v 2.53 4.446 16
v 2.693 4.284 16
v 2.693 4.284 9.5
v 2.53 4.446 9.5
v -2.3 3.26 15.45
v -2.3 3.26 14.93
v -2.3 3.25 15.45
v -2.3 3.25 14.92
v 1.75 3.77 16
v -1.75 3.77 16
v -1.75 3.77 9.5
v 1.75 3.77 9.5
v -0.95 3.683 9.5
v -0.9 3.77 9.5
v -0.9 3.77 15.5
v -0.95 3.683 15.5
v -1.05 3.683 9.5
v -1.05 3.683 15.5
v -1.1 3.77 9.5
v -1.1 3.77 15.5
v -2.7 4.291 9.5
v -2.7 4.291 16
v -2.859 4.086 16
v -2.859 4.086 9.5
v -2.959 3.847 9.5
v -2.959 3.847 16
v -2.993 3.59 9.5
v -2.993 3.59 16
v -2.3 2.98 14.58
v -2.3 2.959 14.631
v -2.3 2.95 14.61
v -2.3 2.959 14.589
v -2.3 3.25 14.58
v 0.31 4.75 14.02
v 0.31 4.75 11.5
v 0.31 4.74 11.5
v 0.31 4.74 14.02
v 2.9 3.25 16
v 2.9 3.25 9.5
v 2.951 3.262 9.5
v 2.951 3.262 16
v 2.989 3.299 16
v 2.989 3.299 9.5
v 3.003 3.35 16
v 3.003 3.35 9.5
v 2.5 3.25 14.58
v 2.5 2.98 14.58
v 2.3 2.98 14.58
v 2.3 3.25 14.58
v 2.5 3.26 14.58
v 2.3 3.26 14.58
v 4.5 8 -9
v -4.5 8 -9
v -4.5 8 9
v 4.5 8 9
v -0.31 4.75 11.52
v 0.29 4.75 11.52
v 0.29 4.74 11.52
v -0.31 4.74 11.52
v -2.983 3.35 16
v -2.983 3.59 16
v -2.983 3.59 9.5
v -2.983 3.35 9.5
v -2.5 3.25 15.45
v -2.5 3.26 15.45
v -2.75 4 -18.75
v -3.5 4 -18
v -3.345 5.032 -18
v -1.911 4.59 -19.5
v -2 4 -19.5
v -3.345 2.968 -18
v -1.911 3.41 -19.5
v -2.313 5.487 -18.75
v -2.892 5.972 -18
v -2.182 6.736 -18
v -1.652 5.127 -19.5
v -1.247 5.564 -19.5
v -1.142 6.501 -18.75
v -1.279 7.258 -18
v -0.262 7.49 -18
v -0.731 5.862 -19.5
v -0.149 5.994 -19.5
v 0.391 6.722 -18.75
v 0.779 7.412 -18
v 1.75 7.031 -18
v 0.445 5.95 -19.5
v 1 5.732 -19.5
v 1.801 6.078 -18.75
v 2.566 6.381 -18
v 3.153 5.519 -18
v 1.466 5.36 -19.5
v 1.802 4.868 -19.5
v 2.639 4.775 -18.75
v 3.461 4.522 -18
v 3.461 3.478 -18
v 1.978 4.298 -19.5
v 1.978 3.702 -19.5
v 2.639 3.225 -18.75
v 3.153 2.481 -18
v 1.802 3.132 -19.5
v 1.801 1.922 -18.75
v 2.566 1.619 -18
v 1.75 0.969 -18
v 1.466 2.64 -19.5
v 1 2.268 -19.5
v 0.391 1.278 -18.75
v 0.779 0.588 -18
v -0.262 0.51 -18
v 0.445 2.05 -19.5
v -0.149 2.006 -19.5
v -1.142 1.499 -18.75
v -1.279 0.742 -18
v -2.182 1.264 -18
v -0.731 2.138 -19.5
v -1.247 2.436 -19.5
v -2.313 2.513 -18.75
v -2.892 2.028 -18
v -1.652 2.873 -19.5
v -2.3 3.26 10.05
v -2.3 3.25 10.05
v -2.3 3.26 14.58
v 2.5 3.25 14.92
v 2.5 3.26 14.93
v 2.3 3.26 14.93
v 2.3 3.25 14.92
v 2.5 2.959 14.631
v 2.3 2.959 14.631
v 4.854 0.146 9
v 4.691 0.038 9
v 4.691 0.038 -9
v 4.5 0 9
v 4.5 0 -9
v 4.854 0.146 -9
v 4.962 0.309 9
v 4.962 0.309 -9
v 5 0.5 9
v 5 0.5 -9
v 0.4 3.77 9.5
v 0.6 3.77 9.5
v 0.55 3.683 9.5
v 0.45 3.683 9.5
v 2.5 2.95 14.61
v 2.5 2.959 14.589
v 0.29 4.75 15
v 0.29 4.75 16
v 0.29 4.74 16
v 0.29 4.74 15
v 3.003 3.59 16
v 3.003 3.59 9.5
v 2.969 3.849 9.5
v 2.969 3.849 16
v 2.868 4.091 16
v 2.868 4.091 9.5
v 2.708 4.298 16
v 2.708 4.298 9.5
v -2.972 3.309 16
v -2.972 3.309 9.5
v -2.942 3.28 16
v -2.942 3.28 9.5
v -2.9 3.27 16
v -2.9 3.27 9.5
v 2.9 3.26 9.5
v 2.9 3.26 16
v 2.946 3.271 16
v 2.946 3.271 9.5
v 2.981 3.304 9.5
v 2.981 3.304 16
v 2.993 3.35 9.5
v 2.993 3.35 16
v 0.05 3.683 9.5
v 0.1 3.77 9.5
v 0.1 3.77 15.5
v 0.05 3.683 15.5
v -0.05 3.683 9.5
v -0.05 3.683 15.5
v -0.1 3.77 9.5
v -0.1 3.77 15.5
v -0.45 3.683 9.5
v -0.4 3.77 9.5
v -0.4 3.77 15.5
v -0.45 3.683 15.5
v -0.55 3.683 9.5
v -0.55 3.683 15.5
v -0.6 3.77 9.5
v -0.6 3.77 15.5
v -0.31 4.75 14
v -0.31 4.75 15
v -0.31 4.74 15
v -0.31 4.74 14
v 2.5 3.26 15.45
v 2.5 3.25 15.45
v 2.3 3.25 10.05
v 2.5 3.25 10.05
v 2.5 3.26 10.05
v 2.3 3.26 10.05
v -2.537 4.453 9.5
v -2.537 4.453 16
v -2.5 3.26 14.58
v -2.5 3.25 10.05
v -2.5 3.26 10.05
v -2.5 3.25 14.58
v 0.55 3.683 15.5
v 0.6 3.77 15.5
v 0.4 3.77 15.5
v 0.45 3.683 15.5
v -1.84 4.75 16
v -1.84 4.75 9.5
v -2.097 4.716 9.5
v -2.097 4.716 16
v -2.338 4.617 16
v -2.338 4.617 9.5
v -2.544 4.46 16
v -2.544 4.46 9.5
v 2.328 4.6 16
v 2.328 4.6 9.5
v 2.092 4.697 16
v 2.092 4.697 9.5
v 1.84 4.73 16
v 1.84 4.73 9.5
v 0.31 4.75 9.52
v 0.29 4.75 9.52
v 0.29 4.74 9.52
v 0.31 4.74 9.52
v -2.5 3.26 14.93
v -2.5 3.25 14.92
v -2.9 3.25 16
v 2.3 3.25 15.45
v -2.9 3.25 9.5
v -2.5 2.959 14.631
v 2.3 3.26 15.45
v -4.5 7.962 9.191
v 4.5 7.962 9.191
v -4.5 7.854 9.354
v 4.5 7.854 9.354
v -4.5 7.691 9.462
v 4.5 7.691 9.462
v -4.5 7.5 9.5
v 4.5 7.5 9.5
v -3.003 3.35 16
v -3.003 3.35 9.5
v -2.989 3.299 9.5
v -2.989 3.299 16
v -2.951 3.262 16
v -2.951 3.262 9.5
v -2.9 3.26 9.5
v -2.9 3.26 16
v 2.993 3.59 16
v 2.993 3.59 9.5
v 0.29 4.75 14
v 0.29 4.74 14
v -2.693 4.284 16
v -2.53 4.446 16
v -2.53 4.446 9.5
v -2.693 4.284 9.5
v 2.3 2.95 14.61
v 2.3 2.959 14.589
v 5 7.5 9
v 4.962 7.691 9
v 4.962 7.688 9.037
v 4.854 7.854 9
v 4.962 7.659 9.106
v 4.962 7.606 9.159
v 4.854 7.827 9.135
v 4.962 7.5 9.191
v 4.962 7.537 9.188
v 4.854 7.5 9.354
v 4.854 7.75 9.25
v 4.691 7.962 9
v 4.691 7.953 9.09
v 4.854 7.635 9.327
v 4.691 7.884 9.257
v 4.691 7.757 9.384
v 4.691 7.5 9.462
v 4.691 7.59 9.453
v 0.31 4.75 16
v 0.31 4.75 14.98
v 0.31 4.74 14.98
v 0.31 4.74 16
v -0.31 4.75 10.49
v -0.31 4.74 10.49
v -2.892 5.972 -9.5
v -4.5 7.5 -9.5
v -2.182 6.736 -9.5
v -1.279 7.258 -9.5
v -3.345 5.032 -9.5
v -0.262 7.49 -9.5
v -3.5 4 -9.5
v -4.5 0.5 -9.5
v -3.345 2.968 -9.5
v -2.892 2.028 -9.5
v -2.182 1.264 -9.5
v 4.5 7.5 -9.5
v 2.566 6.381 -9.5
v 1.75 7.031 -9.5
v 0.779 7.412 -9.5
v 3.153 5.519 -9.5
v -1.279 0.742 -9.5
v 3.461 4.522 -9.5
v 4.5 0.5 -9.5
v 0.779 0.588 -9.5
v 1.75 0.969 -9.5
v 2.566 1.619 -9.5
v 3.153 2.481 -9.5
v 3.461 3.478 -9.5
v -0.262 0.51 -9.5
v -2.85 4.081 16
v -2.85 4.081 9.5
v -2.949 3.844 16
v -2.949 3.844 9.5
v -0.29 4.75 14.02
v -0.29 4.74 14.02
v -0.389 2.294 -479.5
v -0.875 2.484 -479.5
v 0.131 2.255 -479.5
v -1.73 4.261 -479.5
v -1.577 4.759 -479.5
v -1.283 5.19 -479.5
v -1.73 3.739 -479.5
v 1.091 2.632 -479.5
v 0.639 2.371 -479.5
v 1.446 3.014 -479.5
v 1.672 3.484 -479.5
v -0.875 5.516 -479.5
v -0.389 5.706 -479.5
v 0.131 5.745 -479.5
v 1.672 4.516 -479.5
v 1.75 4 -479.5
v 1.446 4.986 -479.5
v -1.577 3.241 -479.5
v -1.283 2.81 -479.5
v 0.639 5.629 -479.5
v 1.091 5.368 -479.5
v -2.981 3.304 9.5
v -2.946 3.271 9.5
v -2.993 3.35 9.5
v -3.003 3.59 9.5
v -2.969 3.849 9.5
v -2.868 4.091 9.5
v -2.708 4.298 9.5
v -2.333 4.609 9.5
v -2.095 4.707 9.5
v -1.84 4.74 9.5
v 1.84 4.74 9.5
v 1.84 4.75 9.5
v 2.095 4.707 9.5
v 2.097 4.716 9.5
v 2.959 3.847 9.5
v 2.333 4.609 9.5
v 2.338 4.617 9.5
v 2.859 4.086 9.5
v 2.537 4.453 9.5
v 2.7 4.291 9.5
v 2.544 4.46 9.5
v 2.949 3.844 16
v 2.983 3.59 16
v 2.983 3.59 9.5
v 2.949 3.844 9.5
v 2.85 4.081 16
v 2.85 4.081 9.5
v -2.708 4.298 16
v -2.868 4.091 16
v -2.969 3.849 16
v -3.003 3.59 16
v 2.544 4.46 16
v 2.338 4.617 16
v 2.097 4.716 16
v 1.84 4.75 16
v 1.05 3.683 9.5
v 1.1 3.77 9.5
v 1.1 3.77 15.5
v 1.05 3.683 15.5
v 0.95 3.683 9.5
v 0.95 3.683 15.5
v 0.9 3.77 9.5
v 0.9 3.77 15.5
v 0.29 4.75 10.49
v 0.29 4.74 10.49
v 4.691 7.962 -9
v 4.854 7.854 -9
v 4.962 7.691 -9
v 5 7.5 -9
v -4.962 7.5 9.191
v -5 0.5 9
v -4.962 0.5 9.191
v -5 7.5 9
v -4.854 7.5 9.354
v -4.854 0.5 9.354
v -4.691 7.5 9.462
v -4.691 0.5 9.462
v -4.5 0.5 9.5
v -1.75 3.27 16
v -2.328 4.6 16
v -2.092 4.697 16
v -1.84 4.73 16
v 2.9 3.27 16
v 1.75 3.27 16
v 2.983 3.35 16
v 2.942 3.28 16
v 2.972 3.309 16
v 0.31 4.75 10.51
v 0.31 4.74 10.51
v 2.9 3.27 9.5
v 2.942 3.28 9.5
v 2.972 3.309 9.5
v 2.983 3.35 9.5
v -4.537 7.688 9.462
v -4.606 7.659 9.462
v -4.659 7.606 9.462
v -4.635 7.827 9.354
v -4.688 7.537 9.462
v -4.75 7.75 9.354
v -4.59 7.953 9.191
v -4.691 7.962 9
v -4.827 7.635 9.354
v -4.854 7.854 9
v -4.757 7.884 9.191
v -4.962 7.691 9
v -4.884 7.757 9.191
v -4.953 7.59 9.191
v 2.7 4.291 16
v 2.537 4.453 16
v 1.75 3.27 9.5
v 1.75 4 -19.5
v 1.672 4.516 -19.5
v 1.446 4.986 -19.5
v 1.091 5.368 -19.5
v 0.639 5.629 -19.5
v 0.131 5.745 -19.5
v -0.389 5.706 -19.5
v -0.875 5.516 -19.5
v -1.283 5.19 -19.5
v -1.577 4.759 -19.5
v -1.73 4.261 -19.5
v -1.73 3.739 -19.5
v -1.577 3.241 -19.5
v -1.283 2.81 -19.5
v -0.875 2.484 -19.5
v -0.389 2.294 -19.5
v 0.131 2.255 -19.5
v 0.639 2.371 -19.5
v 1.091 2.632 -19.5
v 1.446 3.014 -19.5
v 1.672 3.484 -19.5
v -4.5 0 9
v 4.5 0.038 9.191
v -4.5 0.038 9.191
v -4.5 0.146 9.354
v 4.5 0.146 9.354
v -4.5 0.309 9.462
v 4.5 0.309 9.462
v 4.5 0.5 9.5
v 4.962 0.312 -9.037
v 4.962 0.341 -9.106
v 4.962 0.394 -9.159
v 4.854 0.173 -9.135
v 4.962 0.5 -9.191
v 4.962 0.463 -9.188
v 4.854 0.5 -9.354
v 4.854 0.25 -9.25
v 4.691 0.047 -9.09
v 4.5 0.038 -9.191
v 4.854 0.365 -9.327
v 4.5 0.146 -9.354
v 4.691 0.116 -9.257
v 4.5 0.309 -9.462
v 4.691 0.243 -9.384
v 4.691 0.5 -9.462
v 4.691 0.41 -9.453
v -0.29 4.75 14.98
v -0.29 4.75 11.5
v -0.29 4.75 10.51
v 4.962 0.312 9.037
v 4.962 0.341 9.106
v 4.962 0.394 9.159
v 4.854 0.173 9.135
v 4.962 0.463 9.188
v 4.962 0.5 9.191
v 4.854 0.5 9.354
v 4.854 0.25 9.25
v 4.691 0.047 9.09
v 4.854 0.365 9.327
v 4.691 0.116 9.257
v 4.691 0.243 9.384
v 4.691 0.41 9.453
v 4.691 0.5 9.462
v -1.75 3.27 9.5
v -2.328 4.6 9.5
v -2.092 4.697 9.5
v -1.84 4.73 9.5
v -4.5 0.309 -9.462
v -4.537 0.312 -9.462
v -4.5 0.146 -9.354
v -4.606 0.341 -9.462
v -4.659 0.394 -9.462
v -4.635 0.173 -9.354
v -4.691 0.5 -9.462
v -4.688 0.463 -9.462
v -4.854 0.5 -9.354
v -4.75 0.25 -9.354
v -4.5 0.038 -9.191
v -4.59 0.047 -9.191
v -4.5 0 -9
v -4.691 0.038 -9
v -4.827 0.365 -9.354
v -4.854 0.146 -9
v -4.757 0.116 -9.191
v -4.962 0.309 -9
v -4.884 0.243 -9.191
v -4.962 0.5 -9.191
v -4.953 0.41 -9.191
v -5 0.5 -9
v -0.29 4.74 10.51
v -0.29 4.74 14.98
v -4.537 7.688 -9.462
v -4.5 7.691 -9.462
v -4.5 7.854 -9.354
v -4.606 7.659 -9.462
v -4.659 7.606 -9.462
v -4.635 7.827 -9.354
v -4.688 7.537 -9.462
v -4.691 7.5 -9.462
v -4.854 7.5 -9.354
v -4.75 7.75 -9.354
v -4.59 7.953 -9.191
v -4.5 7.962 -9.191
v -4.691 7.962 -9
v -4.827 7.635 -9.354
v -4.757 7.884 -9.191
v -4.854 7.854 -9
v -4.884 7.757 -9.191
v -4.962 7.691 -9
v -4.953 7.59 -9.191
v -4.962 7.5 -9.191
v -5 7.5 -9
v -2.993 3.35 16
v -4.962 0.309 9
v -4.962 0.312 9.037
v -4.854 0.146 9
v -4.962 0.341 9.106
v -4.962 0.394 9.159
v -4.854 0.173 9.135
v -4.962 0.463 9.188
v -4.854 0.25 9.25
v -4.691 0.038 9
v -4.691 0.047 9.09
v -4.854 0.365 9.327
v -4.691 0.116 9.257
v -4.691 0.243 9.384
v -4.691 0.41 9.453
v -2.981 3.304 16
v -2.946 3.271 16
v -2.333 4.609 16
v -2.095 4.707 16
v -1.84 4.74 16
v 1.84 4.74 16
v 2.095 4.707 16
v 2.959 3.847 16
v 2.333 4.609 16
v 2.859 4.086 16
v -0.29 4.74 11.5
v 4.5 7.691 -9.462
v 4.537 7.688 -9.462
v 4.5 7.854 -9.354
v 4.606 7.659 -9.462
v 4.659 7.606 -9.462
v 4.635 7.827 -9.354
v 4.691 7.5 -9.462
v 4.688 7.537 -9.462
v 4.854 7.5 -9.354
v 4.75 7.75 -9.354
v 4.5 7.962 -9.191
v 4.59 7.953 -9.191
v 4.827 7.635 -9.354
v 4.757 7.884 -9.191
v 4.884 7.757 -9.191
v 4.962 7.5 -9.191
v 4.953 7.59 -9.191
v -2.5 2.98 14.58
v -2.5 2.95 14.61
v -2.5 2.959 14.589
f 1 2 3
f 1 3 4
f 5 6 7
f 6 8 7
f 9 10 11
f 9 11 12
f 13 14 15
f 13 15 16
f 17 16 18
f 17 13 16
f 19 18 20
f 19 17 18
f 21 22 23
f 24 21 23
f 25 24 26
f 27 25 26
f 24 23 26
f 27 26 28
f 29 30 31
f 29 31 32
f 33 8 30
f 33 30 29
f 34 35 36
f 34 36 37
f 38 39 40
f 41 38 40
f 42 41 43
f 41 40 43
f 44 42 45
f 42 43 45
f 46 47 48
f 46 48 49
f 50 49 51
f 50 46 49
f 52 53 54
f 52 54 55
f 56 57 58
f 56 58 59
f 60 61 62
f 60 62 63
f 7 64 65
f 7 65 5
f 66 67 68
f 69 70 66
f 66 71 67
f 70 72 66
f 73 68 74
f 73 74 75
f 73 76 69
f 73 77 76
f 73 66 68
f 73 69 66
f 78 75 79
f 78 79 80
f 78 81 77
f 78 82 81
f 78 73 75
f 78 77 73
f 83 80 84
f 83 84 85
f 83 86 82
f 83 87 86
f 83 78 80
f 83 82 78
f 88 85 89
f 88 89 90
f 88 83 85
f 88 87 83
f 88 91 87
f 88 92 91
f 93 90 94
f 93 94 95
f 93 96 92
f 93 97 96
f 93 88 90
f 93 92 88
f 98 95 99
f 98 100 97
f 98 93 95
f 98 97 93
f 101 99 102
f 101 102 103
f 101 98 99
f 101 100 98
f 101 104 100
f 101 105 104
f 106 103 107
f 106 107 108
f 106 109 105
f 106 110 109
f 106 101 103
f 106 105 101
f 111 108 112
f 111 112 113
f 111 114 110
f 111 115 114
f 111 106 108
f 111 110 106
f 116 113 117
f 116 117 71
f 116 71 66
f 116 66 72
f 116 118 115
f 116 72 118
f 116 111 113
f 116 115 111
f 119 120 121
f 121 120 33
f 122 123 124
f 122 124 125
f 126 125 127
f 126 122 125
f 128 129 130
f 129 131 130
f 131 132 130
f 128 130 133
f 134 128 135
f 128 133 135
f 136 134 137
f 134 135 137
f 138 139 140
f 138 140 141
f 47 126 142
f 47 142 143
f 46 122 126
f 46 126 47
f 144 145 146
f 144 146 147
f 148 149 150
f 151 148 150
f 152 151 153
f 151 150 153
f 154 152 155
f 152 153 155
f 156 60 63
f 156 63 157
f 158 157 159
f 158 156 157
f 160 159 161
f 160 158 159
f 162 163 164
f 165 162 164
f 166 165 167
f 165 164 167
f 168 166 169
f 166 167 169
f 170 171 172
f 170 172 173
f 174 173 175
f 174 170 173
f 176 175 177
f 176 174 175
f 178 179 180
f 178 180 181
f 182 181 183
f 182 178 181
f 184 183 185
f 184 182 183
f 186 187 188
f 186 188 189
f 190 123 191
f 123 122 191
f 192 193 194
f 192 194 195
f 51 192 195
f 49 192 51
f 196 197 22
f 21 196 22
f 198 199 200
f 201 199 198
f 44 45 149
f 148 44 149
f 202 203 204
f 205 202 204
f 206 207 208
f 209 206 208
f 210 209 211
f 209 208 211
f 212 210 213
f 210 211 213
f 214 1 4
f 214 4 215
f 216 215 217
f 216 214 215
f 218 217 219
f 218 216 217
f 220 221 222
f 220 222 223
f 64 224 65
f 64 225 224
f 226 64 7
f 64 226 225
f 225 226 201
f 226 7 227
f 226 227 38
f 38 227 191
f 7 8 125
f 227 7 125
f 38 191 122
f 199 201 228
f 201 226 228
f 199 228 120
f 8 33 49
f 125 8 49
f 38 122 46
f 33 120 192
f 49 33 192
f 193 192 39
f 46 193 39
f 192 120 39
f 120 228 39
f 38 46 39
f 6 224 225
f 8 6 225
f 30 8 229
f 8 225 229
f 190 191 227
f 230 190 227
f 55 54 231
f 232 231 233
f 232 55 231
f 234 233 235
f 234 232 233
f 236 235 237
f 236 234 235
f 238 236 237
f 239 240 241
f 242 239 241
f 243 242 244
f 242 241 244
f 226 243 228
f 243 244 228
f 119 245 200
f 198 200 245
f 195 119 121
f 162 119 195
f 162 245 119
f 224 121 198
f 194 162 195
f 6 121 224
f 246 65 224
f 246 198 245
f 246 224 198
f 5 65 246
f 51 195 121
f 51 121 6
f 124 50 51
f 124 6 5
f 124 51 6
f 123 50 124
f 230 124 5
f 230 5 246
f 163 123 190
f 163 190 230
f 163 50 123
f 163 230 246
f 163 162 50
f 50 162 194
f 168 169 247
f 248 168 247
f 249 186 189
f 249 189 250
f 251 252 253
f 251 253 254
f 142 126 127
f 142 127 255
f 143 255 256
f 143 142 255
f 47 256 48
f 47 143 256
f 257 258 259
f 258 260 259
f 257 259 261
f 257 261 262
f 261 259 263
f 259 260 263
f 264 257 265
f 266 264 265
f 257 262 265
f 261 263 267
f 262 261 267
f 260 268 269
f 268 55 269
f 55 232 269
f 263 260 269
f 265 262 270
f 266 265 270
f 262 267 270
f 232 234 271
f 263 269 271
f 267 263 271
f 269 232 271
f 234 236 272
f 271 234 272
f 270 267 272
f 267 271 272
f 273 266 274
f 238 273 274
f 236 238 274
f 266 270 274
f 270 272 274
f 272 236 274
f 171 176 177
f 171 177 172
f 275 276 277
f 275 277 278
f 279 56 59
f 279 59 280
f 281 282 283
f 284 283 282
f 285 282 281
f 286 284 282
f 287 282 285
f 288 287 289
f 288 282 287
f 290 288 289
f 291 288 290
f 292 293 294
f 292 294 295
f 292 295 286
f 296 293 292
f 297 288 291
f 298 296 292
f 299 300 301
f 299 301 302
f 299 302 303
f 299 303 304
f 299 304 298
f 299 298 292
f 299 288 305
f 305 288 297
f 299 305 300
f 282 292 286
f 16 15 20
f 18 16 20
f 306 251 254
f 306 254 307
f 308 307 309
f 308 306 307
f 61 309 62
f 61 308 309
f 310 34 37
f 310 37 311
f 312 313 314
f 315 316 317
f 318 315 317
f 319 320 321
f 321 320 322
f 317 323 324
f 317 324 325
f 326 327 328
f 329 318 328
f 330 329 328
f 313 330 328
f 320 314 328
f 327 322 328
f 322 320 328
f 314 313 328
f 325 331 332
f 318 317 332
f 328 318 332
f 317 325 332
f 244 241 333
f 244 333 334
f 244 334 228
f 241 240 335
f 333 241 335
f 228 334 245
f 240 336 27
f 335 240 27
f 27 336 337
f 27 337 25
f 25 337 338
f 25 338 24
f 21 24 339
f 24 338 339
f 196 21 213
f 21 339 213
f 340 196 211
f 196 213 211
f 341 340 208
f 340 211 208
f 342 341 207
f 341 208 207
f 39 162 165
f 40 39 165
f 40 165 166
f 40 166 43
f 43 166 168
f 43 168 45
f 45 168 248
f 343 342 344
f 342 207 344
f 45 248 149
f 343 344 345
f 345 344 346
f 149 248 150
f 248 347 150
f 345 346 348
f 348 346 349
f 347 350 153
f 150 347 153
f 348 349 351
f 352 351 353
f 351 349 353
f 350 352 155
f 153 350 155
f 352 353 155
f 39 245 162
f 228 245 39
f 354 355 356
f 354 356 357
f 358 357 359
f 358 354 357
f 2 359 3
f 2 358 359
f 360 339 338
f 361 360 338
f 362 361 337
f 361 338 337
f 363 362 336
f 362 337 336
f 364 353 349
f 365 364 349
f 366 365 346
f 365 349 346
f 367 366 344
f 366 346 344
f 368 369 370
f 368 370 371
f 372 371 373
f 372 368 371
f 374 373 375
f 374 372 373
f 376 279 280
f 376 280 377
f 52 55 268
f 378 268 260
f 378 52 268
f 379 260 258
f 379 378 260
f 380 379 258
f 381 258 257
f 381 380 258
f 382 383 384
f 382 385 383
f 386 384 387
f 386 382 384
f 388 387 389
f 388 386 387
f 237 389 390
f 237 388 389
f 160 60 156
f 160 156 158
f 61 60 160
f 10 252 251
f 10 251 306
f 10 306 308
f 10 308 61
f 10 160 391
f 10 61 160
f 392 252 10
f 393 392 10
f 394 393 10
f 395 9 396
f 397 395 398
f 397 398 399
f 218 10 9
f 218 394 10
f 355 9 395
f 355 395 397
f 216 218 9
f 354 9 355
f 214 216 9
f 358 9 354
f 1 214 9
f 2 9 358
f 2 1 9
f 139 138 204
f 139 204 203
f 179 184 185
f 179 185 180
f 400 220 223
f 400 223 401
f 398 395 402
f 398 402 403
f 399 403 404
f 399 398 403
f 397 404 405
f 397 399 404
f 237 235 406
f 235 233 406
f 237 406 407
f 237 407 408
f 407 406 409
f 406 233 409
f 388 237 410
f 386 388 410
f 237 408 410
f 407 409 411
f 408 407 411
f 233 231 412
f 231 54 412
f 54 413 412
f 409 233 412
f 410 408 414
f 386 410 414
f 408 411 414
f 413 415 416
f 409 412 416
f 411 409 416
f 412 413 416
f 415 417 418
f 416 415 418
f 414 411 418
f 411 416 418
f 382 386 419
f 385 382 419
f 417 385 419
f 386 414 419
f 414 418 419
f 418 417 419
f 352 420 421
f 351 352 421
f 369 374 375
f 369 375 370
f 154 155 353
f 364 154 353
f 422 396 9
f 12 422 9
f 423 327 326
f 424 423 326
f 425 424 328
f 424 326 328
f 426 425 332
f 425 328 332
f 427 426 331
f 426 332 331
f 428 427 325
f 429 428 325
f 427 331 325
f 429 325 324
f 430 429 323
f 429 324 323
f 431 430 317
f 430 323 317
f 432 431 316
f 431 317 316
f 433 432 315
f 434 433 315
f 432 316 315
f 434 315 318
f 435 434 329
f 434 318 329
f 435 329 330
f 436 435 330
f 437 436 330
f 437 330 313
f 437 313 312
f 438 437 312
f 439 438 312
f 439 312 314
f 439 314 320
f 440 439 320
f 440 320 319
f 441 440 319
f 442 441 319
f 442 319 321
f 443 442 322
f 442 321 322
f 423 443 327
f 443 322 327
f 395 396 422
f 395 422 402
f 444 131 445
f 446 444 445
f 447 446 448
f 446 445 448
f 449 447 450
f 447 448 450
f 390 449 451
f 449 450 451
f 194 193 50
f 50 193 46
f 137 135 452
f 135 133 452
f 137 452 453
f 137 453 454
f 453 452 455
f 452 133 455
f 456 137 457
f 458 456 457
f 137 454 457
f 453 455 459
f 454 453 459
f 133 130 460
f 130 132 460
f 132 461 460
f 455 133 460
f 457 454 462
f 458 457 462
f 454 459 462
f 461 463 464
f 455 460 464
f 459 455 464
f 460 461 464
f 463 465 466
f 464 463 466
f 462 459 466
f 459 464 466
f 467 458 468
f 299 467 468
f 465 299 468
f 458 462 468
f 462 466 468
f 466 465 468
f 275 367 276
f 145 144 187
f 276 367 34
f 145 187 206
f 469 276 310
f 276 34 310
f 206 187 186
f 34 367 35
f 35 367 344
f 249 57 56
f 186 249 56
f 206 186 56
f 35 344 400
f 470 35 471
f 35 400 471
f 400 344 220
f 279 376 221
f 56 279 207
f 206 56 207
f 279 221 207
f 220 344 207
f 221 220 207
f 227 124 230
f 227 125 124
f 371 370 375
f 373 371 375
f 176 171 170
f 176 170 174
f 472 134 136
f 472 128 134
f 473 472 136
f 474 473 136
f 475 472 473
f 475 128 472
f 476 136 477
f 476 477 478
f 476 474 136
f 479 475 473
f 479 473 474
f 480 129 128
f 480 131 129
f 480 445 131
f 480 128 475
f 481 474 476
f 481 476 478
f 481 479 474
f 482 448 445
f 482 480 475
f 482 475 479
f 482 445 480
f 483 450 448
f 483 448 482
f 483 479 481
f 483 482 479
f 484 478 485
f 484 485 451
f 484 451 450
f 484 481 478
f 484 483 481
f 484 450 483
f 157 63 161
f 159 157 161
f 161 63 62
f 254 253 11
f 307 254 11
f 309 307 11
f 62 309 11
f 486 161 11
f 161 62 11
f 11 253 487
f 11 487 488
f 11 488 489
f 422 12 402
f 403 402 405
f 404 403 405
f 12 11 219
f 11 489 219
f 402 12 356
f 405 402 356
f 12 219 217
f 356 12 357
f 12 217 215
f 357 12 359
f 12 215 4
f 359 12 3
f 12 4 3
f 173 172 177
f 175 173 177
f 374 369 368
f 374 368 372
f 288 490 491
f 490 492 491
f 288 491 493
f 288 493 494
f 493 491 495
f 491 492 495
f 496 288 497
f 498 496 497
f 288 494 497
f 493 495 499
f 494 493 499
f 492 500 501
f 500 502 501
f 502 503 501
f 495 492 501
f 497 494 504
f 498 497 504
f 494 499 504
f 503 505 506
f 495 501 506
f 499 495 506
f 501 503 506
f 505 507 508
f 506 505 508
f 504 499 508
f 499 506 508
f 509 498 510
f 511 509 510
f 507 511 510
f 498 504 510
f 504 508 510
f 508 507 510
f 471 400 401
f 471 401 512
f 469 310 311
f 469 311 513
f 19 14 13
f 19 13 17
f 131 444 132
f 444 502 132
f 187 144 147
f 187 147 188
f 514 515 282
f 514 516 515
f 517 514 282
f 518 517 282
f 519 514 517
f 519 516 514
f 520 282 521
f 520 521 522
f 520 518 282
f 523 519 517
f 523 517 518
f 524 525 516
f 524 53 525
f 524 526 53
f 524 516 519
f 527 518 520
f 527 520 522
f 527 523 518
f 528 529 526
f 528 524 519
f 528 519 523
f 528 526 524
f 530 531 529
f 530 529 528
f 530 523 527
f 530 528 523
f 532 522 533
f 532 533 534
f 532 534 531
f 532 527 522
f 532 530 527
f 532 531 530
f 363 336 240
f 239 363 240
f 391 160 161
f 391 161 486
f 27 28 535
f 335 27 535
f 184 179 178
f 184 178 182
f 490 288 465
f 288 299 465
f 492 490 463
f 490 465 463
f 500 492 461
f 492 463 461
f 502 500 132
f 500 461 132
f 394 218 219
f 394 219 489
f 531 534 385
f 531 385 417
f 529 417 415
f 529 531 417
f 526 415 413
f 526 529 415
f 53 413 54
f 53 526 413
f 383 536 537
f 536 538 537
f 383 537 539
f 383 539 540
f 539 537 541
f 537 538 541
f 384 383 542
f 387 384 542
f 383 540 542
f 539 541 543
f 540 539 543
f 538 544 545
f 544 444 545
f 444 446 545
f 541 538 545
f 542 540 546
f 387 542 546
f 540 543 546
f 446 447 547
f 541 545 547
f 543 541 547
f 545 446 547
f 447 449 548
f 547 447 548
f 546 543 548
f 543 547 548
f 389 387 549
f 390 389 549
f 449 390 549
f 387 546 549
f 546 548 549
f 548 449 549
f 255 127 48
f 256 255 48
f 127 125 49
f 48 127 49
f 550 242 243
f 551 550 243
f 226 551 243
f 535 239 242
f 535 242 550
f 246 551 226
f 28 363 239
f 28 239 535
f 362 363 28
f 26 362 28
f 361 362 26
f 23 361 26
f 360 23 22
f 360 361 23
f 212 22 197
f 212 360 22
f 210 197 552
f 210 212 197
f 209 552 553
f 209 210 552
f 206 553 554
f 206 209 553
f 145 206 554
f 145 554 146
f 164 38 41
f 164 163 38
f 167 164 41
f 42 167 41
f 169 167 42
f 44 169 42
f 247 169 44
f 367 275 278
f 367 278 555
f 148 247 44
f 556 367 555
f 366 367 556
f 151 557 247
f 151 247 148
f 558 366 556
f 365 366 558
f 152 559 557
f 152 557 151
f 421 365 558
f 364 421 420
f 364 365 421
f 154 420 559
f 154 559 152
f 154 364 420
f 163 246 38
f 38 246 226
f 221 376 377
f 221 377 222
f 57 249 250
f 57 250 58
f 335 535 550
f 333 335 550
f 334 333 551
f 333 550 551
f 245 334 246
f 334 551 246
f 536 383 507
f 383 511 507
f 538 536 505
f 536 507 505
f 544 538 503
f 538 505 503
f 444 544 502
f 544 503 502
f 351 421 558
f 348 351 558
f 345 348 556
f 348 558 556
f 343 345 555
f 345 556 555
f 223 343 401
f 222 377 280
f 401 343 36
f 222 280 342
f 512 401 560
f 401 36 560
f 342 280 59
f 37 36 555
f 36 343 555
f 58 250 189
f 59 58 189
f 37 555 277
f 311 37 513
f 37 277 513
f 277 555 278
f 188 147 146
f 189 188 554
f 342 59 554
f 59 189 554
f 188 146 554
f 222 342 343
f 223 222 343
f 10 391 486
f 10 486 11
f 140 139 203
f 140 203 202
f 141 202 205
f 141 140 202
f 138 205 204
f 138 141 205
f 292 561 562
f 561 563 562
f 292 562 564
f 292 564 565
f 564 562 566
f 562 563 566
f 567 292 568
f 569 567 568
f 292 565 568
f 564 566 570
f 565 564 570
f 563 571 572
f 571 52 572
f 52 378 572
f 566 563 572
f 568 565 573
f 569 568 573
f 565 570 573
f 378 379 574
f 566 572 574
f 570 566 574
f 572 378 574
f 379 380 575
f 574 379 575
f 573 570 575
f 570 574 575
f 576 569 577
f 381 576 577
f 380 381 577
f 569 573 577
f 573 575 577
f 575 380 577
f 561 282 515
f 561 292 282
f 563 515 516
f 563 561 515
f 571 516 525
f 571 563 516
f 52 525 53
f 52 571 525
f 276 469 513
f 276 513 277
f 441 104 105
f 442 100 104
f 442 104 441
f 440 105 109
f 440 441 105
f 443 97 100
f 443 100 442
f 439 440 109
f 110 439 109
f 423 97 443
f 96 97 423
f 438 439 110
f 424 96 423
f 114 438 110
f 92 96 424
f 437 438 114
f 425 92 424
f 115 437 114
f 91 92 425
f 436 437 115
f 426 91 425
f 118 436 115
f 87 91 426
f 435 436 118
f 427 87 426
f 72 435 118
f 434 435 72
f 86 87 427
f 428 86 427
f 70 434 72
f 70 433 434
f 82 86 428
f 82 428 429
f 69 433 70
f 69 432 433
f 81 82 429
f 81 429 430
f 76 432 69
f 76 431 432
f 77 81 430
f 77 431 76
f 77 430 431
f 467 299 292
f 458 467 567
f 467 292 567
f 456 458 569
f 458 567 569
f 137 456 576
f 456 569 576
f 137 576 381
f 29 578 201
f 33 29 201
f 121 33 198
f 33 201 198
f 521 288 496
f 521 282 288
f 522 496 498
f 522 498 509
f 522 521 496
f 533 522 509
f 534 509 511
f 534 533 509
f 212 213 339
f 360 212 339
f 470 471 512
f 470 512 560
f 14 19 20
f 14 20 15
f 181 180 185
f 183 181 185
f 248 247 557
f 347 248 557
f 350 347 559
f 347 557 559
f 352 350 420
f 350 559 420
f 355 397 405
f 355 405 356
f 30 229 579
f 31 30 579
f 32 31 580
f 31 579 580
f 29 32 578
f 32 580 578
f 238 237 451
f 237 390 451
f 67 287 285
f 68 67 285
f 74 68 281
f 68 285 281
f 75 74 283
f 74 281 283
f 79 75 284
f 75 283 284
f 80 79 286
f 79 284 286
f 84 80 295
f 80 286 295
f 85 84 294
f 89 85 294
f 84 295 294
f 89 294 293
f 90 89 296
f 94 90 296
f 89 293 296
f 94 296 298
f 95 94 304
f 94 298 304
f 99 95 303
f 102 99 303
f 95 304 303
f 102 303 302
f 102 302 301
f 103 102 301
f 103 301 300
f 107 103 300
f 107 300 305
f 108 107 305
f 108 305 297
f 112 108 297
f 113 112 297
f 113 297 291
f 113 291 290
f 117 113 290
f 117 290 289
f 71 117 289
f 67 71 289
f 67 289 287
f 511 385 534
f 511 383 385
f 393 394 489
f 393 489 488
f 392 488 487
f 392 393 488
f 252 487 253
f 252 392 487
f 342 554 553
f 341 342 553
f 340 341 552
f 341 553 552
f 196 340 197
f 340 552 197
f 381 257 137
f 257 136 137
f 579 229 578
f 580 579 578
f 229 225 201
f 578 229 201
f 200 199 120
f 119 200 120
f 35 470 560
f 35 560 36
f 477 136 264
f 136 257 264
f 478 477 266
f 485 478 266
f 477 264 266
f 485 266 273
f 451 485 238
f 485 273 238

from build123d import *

# Parameters (mm, degrees)
SKETCH1_W                             = 10
SKETCH1_H                             = 19
MAIN_BODY_DEPTH                       = 8
WIRE_ENCAPSULATE_DEPTH                = 10
WIRE_ENCAPSULATE_DEPTH_BACK           = 2
SKETCH2_R                             = 3.5
WIRE_START_SIZE                       = 1.5
MUSB_CONNECTOR_PROFILE_EXTERNAL_DEPTH = 6.5
MUSB_CONNECTOR_PROFILE_INTERNAL_DEPTH = 6.5
SKETCH9_W                             = 3.5
SKETCH9_H                             = 0.5
PIN_ACCESS_DEPTH                      = 6.5
CONTACT_PIN_DEPTH                     = 6
CP_L_COUNT                            = 3
CP_L_PITCH                            = 0.5
CP_L_COL_COUNT                        = 3
CP_L_COL_PITCH                        = 0.5
SHEET_METAL_BOTTOM_MERGE_DEPTH        = 0.02
SKETCH27_W                            = 0.2
SKETCH27_H                            = 5.4
TAB_CUTOUT_DEPTH                      = 0.01
LOCKING_TAB_DEPTH                     = 0.2
WIRE_START                            = -479.5
WIRE_2_OUTLINE_R                      = 1.75
WIRE_2_DEPTH                          = 460
MB_F_R                                = 0.5


# Read off the part's stored shape, not the designer's step: WIRE
with BuildPart() as part:
    # Sketch1 → MAIN BODY (new body)
    with BuildSketch(Plane(origin=(0, 0, 0), x_dir=(1, 0, 0), z_dir=(0, 1, 0))):
        Rectangle(SKETCH1_W, SKETCH1_H)
    extrude(amount=MAIN_BODY_DEPTH)

    # Sketch2 → WIRE ENCAPSULATE (add, two sides: drawn at the far end of the back side and taken through both)
    with BuildSketch(Plane(origin=(0, 0, -9.5), x_dir=(-1, 0, 0), z_dir=(0, 0, -1)).offset(-WIRE_ENCAPSULATE_DEPTH_BACK)):
        with Locations((0, 4)):
            Circle(SKETCH2_R)
    extrude(amount=WIRE_ENCAPSULATE_DEPTH + WIRE_ENCAPSULATE_DEPTH_BACK)

    # WIRE START
    wire_start_edges = [part.edges().sort_by_distance(p)[0] for p in [
        (3.5, 4, -19.5),
    ]]
    chamfer(wire_start_edges, length=WIRE_START_SIZE)

    # WIRE 2 outline → WIRE 2 (add)
    with BuildSketch(Plane.XY.offset(WIRE_START)):
        with Locations((0, 4)):
            Circle(WIRE_2_OUTLINE_R)
    extrude(amount=WIRE_2_DEPTH)

    # MB F
    mb_f_edges = [part.edges().sort_by_distance(p)[0] for p in [
        (-5, 8, 0),
        (0, 8, 9.5),
        (5, 8, 0),
        (0, 0, 9.5),
        (-5, 0, 0),
        (0, 0, -9.5),
        (5, 0, 0),
        (0, 8, -9.5),
        (5, 4, 9.5),
        (-5, 4, 9.5),
        (-5, 4, -9.5),
        (5, 4, -9.5),
    ]]
    fillet(mb_f_edges, radius=MB_F_R - 0.0001)  # a hair under: the kernel refuses the full size


with BuildPart() as body_2:
    # Sketch6 → MUSB CONNECTOR PROFILE EXTERNAL (new body)
    with BuildSketch(Plane.XY.offset(9.5)):
        with BuildLine():
            Line((3.003298067, 3.35), (3.003298067, 3.59))
            ThreePointArc((3.003298067, 3.59), (2.926014523, 3.973517609), (2.707501676, 4.298033615))
            Line((2.707501676, 4.298033615), (2.544201676, 4.46))
            ThreePointArc((2.544201676, 4.46), (2.220788655, 4.6746621), (1.84, 4.75))
            Line((1.84, 4.75), (-1.84, 4.75))
            ThreePointArc((-1.84, 4.75), (-2.220788655, 4.6746621), (-2.544201676, 4.46))
            Line((-2.544201676, 4.46), (-2.707501676, 4.298033615))
            ThreePointArc((-2.707501676, 4.298033615), (-2.926014523, 3.973517609), (-3.003298067, 3.59))
            Line((-3.003298067, 3.59), (-3.003298067, 3.35))
            ThreePointArc((-3.003298067, 3.35), (-2.972852481, 3.278097248), (-2.9, 3.25))
            Line((-2.9, 3.25), (2.9, 3.25))
            ThreePointArc((2.9, 3.25), (2.972852481, 3.278097248), (3.003298067, 3.35))
        make_face()
    extrude(amount=MUSB_CONNECTOR_PROFILE_EXTERNAL_DEPTH)

    # Sketch7 → MUSB CONNECTOR PROFILE INTERNAL (cut)
    with BuildSketch(Plane.XY.offset(16)):
        with BuildLine():
            Line((2.700459659, 4.290933615), (2.537159659, 4.4529))
            ThreePointArc((2.537159659, 4.4529), (2.216980769, 4.665415479), (1.84, 4.74))
            Line((1.84, 4.74), (-1.84, 4.74))
            ThreePointArc((-1.84, 4.74), (-2.216980769, 4.665415479), (-2.537159659, 4.4529))
            Line((-2.537159659, 4.4529), (-2.700459659, 4.290933615))
            ThreePointArc((-2.700459659, 4.290933615), (-2.916785483, 3.969667304), (-2.993298076, 3.589990168))
            Line((-2.993298076, 3.589990168), (-2.993298067, 3.35))
            ThreePointArc((-2.993298067, 3.35), (-2.965841277, 3.285228144), (-2.900169294, 3.26))
            Line((-2.900169294, 3.26), (2.900169294, 3.26))
            ThreePointArc((2.900169294, 3.26), (2.96583932, 3.285226254), (2.993298068, 3.34999456))
            Line((2.993298068, 3.34999456), (2.993298076, 3.589990168))
            ThreePointArc((2.993298076, 3.589990168), (2.916785492, 3.969667308), (2.700459659, 4.290933615))
        make_face()
        with BuildLine():
            Line((2.693417642, 4.283833615), (2.530117642, 4.4458))
            ThreePointArc((2.530117642, 4.4458), (2.213172882, 4.656168858), (1.84, 4.73))
            Line((1.84, 4.73), (-1.84, 4.73))
            ThreePointArc((-1.84, 4.73), (-2.213172882, 4.656168858), (-2.530117642, 4.4458))
            Line((-2.530117642, 4.4458), (-2.693417642, 4.283833615))
            ThreePointArc((-2.693417642, 4.283833615), (-2.907556457, 3.965816966), (-2.983298076, 3.589980261))
            Line((-2.983298076, 3.589980261), (-2.983298067, 3.349996889))
            ThreePointArc((-2.983298067, 3.349996889), (-2.958832383, 3.292361385), (-2.900348288, 3.27))
            Line((-2.900348288, 3.27), (2.900348288, 3.27))
            ThreePointArc((2.900348288, 3.27), (2.958830536, 3.292359606), (2.983298068, 3.34999176))
            Line((2.983298068, 3.34999176), (2.983298076, 3.589980262))
            ThreePointArc((2.983298076, 3.589980262), (2.907556466, 3.965816969), (2.693417642, 4.283833614))
        make_face(mode=Mode.SUBTRACT)
    extrude(amount=-MUSB_CONNECTOR_PROFILE_INTERNAL_DEPTH, mode=Mode.SUBTRACT)


with BuildPart() as musb_connector_profile_internal_piece_1:
    # of the separate pieces the step leaves, piece 1, a body of its own (musb_connector_profile_internal_pieces)
    add(body_2.part.solids().sort_by_distance((2.983298068, 3.34999176, 9.5))[0])

    # Sketch9 → PIN ACCESS (cut)
    with BuildSketch(Plane.XY.offset(16)):
        with Locations((0, 3.52)):
            Rectangle(SKETCH9_W, SKETCH9_H)
    extrude(amount=-PIN_ACCESS_DEPTH, mode=Mode.SUBTRACT)


with BuildPart() as musb_connector_profile_internal_piece_2:
    # of the separate pieces the step leaves, piece 2, a body of its own (musb_connector_profile_internal_pieces)
    add(body_2.part.solids().sort_by_distance((3.003298067, 3.35, 9.5))[0])

    # Sketch26 → SHEET METAL BOTTOM MERGE (cut)
    with BuildSketch(Plane(origin=(0, 4.75, 0), x_dir=(1, 0, 0), z_dir=(0, 1, 0))):
        Polygon((0.29, -16), (0.29, -15), (-0.31, -15), (-0.31, -14), (0.29, -14), (0.29, -11.52), (-0.31, -11.52), (-0.31, -10.49), (0.29, -10.49), (0.29, -9.52), (0.31, -9.52), (0.31, -10.51), (-0.29, -10.51), (-0.29, -11.5), (0.31, -11.5), (0.31, -14.02), (-0.29, -14.02), (-0.29, -14.98), (0.31, -14.98), (0.31, -16), align=None)
    extrude(amount=-SHEET_METAL_BOTTOM_MERGE_DEPTH, mode=Mode.SUBTRACT)

    # Sketch27 → TAB CUTOUT (cut)
    with BuildSketch(Plane.XZ.offset(-3.25)):
        with Locations((-2.4, 12.75)):
            Rectangle(SKETCH27_W, SKETCH27_H)
    tab_cutout = extrude(amount=-TAB_CUTOUT_DEPTH, mode=Mode.SUBTRACT)

    # Sketch28 → LOCKING TAB (add)
    with BuildSketch(Plane(origin=(-2.5, 0, 0), x_dir=(0, 0, -1), z_dir=(1, 0, 0))):
        with BuildLine():
            Line((-14.930096163, 3.26), (-14.631394991, 2.958872768))
            ThreePointArc((-14.631394991, 2.958872768), (-14.598671734, 2.952260454), (-14.580096163, 2.98))
            Line((-14.580096163, 2.98), (-14.580096163, 3.26))
            Line((-14.580096163, 3.26), (-14.930096163, 3.26))
        make_face()
    locking_tab = extrude(amount=LOCKING_TAB_DEPTH)

    # Mirror1: TAB CUTOUT, LOCKING TAB across plane
    add(tab_cutout.mirror(Plane(origin=(0, 0, 0), x_dir=(0, 0, 1), z_dir=(1, 0, 0))), mode=Mode.SUBTRACT)
    add(locking_tab.mirror(Plane(origin=(0, 0, 0), x_dir=(0, 0, 1), z_dir=(1, 0, 0))))


with BuildPart() as body_4:
    # Sketch10 → CONTACT PIN (new body)
    with BuildSketch(Plane.XY.offset(9.5)):
        with BuildLine():
            Line((-0.1, 3.77), (0.1, 3.77))
            ThreePointArc((0.1, 3.77), (0, 3.67), (-0.1, 3.77))
        make_face()
    contact_pin = extrude(amount=CONTACT_PIN_DEPTH)


with BuildPart() as cp_l_1:
    # CP L: CONTACT PIN ×3
    with Locations(*[(-i * CP_L_PITCH, 0, 0) for i in range(1, CP_L_COUNT)]):
        add(contact_pin)


with BuildPart() as cp_l_col_1:
    # CP L col: CONTACT PIN ×3
    with Locations(*[(i * CP_L_COL_PITCH, 0, 0) for i in range(1, CP_L_COL_COUNT)]):
        add(contact_pin)


solid = Compound([part.part, musb_connector_profile_internal_piece_1.part, musb_connector_profile_internal_piece_2.part, body_4.part, cp_l_1.part, cp_l_col_1.part])
